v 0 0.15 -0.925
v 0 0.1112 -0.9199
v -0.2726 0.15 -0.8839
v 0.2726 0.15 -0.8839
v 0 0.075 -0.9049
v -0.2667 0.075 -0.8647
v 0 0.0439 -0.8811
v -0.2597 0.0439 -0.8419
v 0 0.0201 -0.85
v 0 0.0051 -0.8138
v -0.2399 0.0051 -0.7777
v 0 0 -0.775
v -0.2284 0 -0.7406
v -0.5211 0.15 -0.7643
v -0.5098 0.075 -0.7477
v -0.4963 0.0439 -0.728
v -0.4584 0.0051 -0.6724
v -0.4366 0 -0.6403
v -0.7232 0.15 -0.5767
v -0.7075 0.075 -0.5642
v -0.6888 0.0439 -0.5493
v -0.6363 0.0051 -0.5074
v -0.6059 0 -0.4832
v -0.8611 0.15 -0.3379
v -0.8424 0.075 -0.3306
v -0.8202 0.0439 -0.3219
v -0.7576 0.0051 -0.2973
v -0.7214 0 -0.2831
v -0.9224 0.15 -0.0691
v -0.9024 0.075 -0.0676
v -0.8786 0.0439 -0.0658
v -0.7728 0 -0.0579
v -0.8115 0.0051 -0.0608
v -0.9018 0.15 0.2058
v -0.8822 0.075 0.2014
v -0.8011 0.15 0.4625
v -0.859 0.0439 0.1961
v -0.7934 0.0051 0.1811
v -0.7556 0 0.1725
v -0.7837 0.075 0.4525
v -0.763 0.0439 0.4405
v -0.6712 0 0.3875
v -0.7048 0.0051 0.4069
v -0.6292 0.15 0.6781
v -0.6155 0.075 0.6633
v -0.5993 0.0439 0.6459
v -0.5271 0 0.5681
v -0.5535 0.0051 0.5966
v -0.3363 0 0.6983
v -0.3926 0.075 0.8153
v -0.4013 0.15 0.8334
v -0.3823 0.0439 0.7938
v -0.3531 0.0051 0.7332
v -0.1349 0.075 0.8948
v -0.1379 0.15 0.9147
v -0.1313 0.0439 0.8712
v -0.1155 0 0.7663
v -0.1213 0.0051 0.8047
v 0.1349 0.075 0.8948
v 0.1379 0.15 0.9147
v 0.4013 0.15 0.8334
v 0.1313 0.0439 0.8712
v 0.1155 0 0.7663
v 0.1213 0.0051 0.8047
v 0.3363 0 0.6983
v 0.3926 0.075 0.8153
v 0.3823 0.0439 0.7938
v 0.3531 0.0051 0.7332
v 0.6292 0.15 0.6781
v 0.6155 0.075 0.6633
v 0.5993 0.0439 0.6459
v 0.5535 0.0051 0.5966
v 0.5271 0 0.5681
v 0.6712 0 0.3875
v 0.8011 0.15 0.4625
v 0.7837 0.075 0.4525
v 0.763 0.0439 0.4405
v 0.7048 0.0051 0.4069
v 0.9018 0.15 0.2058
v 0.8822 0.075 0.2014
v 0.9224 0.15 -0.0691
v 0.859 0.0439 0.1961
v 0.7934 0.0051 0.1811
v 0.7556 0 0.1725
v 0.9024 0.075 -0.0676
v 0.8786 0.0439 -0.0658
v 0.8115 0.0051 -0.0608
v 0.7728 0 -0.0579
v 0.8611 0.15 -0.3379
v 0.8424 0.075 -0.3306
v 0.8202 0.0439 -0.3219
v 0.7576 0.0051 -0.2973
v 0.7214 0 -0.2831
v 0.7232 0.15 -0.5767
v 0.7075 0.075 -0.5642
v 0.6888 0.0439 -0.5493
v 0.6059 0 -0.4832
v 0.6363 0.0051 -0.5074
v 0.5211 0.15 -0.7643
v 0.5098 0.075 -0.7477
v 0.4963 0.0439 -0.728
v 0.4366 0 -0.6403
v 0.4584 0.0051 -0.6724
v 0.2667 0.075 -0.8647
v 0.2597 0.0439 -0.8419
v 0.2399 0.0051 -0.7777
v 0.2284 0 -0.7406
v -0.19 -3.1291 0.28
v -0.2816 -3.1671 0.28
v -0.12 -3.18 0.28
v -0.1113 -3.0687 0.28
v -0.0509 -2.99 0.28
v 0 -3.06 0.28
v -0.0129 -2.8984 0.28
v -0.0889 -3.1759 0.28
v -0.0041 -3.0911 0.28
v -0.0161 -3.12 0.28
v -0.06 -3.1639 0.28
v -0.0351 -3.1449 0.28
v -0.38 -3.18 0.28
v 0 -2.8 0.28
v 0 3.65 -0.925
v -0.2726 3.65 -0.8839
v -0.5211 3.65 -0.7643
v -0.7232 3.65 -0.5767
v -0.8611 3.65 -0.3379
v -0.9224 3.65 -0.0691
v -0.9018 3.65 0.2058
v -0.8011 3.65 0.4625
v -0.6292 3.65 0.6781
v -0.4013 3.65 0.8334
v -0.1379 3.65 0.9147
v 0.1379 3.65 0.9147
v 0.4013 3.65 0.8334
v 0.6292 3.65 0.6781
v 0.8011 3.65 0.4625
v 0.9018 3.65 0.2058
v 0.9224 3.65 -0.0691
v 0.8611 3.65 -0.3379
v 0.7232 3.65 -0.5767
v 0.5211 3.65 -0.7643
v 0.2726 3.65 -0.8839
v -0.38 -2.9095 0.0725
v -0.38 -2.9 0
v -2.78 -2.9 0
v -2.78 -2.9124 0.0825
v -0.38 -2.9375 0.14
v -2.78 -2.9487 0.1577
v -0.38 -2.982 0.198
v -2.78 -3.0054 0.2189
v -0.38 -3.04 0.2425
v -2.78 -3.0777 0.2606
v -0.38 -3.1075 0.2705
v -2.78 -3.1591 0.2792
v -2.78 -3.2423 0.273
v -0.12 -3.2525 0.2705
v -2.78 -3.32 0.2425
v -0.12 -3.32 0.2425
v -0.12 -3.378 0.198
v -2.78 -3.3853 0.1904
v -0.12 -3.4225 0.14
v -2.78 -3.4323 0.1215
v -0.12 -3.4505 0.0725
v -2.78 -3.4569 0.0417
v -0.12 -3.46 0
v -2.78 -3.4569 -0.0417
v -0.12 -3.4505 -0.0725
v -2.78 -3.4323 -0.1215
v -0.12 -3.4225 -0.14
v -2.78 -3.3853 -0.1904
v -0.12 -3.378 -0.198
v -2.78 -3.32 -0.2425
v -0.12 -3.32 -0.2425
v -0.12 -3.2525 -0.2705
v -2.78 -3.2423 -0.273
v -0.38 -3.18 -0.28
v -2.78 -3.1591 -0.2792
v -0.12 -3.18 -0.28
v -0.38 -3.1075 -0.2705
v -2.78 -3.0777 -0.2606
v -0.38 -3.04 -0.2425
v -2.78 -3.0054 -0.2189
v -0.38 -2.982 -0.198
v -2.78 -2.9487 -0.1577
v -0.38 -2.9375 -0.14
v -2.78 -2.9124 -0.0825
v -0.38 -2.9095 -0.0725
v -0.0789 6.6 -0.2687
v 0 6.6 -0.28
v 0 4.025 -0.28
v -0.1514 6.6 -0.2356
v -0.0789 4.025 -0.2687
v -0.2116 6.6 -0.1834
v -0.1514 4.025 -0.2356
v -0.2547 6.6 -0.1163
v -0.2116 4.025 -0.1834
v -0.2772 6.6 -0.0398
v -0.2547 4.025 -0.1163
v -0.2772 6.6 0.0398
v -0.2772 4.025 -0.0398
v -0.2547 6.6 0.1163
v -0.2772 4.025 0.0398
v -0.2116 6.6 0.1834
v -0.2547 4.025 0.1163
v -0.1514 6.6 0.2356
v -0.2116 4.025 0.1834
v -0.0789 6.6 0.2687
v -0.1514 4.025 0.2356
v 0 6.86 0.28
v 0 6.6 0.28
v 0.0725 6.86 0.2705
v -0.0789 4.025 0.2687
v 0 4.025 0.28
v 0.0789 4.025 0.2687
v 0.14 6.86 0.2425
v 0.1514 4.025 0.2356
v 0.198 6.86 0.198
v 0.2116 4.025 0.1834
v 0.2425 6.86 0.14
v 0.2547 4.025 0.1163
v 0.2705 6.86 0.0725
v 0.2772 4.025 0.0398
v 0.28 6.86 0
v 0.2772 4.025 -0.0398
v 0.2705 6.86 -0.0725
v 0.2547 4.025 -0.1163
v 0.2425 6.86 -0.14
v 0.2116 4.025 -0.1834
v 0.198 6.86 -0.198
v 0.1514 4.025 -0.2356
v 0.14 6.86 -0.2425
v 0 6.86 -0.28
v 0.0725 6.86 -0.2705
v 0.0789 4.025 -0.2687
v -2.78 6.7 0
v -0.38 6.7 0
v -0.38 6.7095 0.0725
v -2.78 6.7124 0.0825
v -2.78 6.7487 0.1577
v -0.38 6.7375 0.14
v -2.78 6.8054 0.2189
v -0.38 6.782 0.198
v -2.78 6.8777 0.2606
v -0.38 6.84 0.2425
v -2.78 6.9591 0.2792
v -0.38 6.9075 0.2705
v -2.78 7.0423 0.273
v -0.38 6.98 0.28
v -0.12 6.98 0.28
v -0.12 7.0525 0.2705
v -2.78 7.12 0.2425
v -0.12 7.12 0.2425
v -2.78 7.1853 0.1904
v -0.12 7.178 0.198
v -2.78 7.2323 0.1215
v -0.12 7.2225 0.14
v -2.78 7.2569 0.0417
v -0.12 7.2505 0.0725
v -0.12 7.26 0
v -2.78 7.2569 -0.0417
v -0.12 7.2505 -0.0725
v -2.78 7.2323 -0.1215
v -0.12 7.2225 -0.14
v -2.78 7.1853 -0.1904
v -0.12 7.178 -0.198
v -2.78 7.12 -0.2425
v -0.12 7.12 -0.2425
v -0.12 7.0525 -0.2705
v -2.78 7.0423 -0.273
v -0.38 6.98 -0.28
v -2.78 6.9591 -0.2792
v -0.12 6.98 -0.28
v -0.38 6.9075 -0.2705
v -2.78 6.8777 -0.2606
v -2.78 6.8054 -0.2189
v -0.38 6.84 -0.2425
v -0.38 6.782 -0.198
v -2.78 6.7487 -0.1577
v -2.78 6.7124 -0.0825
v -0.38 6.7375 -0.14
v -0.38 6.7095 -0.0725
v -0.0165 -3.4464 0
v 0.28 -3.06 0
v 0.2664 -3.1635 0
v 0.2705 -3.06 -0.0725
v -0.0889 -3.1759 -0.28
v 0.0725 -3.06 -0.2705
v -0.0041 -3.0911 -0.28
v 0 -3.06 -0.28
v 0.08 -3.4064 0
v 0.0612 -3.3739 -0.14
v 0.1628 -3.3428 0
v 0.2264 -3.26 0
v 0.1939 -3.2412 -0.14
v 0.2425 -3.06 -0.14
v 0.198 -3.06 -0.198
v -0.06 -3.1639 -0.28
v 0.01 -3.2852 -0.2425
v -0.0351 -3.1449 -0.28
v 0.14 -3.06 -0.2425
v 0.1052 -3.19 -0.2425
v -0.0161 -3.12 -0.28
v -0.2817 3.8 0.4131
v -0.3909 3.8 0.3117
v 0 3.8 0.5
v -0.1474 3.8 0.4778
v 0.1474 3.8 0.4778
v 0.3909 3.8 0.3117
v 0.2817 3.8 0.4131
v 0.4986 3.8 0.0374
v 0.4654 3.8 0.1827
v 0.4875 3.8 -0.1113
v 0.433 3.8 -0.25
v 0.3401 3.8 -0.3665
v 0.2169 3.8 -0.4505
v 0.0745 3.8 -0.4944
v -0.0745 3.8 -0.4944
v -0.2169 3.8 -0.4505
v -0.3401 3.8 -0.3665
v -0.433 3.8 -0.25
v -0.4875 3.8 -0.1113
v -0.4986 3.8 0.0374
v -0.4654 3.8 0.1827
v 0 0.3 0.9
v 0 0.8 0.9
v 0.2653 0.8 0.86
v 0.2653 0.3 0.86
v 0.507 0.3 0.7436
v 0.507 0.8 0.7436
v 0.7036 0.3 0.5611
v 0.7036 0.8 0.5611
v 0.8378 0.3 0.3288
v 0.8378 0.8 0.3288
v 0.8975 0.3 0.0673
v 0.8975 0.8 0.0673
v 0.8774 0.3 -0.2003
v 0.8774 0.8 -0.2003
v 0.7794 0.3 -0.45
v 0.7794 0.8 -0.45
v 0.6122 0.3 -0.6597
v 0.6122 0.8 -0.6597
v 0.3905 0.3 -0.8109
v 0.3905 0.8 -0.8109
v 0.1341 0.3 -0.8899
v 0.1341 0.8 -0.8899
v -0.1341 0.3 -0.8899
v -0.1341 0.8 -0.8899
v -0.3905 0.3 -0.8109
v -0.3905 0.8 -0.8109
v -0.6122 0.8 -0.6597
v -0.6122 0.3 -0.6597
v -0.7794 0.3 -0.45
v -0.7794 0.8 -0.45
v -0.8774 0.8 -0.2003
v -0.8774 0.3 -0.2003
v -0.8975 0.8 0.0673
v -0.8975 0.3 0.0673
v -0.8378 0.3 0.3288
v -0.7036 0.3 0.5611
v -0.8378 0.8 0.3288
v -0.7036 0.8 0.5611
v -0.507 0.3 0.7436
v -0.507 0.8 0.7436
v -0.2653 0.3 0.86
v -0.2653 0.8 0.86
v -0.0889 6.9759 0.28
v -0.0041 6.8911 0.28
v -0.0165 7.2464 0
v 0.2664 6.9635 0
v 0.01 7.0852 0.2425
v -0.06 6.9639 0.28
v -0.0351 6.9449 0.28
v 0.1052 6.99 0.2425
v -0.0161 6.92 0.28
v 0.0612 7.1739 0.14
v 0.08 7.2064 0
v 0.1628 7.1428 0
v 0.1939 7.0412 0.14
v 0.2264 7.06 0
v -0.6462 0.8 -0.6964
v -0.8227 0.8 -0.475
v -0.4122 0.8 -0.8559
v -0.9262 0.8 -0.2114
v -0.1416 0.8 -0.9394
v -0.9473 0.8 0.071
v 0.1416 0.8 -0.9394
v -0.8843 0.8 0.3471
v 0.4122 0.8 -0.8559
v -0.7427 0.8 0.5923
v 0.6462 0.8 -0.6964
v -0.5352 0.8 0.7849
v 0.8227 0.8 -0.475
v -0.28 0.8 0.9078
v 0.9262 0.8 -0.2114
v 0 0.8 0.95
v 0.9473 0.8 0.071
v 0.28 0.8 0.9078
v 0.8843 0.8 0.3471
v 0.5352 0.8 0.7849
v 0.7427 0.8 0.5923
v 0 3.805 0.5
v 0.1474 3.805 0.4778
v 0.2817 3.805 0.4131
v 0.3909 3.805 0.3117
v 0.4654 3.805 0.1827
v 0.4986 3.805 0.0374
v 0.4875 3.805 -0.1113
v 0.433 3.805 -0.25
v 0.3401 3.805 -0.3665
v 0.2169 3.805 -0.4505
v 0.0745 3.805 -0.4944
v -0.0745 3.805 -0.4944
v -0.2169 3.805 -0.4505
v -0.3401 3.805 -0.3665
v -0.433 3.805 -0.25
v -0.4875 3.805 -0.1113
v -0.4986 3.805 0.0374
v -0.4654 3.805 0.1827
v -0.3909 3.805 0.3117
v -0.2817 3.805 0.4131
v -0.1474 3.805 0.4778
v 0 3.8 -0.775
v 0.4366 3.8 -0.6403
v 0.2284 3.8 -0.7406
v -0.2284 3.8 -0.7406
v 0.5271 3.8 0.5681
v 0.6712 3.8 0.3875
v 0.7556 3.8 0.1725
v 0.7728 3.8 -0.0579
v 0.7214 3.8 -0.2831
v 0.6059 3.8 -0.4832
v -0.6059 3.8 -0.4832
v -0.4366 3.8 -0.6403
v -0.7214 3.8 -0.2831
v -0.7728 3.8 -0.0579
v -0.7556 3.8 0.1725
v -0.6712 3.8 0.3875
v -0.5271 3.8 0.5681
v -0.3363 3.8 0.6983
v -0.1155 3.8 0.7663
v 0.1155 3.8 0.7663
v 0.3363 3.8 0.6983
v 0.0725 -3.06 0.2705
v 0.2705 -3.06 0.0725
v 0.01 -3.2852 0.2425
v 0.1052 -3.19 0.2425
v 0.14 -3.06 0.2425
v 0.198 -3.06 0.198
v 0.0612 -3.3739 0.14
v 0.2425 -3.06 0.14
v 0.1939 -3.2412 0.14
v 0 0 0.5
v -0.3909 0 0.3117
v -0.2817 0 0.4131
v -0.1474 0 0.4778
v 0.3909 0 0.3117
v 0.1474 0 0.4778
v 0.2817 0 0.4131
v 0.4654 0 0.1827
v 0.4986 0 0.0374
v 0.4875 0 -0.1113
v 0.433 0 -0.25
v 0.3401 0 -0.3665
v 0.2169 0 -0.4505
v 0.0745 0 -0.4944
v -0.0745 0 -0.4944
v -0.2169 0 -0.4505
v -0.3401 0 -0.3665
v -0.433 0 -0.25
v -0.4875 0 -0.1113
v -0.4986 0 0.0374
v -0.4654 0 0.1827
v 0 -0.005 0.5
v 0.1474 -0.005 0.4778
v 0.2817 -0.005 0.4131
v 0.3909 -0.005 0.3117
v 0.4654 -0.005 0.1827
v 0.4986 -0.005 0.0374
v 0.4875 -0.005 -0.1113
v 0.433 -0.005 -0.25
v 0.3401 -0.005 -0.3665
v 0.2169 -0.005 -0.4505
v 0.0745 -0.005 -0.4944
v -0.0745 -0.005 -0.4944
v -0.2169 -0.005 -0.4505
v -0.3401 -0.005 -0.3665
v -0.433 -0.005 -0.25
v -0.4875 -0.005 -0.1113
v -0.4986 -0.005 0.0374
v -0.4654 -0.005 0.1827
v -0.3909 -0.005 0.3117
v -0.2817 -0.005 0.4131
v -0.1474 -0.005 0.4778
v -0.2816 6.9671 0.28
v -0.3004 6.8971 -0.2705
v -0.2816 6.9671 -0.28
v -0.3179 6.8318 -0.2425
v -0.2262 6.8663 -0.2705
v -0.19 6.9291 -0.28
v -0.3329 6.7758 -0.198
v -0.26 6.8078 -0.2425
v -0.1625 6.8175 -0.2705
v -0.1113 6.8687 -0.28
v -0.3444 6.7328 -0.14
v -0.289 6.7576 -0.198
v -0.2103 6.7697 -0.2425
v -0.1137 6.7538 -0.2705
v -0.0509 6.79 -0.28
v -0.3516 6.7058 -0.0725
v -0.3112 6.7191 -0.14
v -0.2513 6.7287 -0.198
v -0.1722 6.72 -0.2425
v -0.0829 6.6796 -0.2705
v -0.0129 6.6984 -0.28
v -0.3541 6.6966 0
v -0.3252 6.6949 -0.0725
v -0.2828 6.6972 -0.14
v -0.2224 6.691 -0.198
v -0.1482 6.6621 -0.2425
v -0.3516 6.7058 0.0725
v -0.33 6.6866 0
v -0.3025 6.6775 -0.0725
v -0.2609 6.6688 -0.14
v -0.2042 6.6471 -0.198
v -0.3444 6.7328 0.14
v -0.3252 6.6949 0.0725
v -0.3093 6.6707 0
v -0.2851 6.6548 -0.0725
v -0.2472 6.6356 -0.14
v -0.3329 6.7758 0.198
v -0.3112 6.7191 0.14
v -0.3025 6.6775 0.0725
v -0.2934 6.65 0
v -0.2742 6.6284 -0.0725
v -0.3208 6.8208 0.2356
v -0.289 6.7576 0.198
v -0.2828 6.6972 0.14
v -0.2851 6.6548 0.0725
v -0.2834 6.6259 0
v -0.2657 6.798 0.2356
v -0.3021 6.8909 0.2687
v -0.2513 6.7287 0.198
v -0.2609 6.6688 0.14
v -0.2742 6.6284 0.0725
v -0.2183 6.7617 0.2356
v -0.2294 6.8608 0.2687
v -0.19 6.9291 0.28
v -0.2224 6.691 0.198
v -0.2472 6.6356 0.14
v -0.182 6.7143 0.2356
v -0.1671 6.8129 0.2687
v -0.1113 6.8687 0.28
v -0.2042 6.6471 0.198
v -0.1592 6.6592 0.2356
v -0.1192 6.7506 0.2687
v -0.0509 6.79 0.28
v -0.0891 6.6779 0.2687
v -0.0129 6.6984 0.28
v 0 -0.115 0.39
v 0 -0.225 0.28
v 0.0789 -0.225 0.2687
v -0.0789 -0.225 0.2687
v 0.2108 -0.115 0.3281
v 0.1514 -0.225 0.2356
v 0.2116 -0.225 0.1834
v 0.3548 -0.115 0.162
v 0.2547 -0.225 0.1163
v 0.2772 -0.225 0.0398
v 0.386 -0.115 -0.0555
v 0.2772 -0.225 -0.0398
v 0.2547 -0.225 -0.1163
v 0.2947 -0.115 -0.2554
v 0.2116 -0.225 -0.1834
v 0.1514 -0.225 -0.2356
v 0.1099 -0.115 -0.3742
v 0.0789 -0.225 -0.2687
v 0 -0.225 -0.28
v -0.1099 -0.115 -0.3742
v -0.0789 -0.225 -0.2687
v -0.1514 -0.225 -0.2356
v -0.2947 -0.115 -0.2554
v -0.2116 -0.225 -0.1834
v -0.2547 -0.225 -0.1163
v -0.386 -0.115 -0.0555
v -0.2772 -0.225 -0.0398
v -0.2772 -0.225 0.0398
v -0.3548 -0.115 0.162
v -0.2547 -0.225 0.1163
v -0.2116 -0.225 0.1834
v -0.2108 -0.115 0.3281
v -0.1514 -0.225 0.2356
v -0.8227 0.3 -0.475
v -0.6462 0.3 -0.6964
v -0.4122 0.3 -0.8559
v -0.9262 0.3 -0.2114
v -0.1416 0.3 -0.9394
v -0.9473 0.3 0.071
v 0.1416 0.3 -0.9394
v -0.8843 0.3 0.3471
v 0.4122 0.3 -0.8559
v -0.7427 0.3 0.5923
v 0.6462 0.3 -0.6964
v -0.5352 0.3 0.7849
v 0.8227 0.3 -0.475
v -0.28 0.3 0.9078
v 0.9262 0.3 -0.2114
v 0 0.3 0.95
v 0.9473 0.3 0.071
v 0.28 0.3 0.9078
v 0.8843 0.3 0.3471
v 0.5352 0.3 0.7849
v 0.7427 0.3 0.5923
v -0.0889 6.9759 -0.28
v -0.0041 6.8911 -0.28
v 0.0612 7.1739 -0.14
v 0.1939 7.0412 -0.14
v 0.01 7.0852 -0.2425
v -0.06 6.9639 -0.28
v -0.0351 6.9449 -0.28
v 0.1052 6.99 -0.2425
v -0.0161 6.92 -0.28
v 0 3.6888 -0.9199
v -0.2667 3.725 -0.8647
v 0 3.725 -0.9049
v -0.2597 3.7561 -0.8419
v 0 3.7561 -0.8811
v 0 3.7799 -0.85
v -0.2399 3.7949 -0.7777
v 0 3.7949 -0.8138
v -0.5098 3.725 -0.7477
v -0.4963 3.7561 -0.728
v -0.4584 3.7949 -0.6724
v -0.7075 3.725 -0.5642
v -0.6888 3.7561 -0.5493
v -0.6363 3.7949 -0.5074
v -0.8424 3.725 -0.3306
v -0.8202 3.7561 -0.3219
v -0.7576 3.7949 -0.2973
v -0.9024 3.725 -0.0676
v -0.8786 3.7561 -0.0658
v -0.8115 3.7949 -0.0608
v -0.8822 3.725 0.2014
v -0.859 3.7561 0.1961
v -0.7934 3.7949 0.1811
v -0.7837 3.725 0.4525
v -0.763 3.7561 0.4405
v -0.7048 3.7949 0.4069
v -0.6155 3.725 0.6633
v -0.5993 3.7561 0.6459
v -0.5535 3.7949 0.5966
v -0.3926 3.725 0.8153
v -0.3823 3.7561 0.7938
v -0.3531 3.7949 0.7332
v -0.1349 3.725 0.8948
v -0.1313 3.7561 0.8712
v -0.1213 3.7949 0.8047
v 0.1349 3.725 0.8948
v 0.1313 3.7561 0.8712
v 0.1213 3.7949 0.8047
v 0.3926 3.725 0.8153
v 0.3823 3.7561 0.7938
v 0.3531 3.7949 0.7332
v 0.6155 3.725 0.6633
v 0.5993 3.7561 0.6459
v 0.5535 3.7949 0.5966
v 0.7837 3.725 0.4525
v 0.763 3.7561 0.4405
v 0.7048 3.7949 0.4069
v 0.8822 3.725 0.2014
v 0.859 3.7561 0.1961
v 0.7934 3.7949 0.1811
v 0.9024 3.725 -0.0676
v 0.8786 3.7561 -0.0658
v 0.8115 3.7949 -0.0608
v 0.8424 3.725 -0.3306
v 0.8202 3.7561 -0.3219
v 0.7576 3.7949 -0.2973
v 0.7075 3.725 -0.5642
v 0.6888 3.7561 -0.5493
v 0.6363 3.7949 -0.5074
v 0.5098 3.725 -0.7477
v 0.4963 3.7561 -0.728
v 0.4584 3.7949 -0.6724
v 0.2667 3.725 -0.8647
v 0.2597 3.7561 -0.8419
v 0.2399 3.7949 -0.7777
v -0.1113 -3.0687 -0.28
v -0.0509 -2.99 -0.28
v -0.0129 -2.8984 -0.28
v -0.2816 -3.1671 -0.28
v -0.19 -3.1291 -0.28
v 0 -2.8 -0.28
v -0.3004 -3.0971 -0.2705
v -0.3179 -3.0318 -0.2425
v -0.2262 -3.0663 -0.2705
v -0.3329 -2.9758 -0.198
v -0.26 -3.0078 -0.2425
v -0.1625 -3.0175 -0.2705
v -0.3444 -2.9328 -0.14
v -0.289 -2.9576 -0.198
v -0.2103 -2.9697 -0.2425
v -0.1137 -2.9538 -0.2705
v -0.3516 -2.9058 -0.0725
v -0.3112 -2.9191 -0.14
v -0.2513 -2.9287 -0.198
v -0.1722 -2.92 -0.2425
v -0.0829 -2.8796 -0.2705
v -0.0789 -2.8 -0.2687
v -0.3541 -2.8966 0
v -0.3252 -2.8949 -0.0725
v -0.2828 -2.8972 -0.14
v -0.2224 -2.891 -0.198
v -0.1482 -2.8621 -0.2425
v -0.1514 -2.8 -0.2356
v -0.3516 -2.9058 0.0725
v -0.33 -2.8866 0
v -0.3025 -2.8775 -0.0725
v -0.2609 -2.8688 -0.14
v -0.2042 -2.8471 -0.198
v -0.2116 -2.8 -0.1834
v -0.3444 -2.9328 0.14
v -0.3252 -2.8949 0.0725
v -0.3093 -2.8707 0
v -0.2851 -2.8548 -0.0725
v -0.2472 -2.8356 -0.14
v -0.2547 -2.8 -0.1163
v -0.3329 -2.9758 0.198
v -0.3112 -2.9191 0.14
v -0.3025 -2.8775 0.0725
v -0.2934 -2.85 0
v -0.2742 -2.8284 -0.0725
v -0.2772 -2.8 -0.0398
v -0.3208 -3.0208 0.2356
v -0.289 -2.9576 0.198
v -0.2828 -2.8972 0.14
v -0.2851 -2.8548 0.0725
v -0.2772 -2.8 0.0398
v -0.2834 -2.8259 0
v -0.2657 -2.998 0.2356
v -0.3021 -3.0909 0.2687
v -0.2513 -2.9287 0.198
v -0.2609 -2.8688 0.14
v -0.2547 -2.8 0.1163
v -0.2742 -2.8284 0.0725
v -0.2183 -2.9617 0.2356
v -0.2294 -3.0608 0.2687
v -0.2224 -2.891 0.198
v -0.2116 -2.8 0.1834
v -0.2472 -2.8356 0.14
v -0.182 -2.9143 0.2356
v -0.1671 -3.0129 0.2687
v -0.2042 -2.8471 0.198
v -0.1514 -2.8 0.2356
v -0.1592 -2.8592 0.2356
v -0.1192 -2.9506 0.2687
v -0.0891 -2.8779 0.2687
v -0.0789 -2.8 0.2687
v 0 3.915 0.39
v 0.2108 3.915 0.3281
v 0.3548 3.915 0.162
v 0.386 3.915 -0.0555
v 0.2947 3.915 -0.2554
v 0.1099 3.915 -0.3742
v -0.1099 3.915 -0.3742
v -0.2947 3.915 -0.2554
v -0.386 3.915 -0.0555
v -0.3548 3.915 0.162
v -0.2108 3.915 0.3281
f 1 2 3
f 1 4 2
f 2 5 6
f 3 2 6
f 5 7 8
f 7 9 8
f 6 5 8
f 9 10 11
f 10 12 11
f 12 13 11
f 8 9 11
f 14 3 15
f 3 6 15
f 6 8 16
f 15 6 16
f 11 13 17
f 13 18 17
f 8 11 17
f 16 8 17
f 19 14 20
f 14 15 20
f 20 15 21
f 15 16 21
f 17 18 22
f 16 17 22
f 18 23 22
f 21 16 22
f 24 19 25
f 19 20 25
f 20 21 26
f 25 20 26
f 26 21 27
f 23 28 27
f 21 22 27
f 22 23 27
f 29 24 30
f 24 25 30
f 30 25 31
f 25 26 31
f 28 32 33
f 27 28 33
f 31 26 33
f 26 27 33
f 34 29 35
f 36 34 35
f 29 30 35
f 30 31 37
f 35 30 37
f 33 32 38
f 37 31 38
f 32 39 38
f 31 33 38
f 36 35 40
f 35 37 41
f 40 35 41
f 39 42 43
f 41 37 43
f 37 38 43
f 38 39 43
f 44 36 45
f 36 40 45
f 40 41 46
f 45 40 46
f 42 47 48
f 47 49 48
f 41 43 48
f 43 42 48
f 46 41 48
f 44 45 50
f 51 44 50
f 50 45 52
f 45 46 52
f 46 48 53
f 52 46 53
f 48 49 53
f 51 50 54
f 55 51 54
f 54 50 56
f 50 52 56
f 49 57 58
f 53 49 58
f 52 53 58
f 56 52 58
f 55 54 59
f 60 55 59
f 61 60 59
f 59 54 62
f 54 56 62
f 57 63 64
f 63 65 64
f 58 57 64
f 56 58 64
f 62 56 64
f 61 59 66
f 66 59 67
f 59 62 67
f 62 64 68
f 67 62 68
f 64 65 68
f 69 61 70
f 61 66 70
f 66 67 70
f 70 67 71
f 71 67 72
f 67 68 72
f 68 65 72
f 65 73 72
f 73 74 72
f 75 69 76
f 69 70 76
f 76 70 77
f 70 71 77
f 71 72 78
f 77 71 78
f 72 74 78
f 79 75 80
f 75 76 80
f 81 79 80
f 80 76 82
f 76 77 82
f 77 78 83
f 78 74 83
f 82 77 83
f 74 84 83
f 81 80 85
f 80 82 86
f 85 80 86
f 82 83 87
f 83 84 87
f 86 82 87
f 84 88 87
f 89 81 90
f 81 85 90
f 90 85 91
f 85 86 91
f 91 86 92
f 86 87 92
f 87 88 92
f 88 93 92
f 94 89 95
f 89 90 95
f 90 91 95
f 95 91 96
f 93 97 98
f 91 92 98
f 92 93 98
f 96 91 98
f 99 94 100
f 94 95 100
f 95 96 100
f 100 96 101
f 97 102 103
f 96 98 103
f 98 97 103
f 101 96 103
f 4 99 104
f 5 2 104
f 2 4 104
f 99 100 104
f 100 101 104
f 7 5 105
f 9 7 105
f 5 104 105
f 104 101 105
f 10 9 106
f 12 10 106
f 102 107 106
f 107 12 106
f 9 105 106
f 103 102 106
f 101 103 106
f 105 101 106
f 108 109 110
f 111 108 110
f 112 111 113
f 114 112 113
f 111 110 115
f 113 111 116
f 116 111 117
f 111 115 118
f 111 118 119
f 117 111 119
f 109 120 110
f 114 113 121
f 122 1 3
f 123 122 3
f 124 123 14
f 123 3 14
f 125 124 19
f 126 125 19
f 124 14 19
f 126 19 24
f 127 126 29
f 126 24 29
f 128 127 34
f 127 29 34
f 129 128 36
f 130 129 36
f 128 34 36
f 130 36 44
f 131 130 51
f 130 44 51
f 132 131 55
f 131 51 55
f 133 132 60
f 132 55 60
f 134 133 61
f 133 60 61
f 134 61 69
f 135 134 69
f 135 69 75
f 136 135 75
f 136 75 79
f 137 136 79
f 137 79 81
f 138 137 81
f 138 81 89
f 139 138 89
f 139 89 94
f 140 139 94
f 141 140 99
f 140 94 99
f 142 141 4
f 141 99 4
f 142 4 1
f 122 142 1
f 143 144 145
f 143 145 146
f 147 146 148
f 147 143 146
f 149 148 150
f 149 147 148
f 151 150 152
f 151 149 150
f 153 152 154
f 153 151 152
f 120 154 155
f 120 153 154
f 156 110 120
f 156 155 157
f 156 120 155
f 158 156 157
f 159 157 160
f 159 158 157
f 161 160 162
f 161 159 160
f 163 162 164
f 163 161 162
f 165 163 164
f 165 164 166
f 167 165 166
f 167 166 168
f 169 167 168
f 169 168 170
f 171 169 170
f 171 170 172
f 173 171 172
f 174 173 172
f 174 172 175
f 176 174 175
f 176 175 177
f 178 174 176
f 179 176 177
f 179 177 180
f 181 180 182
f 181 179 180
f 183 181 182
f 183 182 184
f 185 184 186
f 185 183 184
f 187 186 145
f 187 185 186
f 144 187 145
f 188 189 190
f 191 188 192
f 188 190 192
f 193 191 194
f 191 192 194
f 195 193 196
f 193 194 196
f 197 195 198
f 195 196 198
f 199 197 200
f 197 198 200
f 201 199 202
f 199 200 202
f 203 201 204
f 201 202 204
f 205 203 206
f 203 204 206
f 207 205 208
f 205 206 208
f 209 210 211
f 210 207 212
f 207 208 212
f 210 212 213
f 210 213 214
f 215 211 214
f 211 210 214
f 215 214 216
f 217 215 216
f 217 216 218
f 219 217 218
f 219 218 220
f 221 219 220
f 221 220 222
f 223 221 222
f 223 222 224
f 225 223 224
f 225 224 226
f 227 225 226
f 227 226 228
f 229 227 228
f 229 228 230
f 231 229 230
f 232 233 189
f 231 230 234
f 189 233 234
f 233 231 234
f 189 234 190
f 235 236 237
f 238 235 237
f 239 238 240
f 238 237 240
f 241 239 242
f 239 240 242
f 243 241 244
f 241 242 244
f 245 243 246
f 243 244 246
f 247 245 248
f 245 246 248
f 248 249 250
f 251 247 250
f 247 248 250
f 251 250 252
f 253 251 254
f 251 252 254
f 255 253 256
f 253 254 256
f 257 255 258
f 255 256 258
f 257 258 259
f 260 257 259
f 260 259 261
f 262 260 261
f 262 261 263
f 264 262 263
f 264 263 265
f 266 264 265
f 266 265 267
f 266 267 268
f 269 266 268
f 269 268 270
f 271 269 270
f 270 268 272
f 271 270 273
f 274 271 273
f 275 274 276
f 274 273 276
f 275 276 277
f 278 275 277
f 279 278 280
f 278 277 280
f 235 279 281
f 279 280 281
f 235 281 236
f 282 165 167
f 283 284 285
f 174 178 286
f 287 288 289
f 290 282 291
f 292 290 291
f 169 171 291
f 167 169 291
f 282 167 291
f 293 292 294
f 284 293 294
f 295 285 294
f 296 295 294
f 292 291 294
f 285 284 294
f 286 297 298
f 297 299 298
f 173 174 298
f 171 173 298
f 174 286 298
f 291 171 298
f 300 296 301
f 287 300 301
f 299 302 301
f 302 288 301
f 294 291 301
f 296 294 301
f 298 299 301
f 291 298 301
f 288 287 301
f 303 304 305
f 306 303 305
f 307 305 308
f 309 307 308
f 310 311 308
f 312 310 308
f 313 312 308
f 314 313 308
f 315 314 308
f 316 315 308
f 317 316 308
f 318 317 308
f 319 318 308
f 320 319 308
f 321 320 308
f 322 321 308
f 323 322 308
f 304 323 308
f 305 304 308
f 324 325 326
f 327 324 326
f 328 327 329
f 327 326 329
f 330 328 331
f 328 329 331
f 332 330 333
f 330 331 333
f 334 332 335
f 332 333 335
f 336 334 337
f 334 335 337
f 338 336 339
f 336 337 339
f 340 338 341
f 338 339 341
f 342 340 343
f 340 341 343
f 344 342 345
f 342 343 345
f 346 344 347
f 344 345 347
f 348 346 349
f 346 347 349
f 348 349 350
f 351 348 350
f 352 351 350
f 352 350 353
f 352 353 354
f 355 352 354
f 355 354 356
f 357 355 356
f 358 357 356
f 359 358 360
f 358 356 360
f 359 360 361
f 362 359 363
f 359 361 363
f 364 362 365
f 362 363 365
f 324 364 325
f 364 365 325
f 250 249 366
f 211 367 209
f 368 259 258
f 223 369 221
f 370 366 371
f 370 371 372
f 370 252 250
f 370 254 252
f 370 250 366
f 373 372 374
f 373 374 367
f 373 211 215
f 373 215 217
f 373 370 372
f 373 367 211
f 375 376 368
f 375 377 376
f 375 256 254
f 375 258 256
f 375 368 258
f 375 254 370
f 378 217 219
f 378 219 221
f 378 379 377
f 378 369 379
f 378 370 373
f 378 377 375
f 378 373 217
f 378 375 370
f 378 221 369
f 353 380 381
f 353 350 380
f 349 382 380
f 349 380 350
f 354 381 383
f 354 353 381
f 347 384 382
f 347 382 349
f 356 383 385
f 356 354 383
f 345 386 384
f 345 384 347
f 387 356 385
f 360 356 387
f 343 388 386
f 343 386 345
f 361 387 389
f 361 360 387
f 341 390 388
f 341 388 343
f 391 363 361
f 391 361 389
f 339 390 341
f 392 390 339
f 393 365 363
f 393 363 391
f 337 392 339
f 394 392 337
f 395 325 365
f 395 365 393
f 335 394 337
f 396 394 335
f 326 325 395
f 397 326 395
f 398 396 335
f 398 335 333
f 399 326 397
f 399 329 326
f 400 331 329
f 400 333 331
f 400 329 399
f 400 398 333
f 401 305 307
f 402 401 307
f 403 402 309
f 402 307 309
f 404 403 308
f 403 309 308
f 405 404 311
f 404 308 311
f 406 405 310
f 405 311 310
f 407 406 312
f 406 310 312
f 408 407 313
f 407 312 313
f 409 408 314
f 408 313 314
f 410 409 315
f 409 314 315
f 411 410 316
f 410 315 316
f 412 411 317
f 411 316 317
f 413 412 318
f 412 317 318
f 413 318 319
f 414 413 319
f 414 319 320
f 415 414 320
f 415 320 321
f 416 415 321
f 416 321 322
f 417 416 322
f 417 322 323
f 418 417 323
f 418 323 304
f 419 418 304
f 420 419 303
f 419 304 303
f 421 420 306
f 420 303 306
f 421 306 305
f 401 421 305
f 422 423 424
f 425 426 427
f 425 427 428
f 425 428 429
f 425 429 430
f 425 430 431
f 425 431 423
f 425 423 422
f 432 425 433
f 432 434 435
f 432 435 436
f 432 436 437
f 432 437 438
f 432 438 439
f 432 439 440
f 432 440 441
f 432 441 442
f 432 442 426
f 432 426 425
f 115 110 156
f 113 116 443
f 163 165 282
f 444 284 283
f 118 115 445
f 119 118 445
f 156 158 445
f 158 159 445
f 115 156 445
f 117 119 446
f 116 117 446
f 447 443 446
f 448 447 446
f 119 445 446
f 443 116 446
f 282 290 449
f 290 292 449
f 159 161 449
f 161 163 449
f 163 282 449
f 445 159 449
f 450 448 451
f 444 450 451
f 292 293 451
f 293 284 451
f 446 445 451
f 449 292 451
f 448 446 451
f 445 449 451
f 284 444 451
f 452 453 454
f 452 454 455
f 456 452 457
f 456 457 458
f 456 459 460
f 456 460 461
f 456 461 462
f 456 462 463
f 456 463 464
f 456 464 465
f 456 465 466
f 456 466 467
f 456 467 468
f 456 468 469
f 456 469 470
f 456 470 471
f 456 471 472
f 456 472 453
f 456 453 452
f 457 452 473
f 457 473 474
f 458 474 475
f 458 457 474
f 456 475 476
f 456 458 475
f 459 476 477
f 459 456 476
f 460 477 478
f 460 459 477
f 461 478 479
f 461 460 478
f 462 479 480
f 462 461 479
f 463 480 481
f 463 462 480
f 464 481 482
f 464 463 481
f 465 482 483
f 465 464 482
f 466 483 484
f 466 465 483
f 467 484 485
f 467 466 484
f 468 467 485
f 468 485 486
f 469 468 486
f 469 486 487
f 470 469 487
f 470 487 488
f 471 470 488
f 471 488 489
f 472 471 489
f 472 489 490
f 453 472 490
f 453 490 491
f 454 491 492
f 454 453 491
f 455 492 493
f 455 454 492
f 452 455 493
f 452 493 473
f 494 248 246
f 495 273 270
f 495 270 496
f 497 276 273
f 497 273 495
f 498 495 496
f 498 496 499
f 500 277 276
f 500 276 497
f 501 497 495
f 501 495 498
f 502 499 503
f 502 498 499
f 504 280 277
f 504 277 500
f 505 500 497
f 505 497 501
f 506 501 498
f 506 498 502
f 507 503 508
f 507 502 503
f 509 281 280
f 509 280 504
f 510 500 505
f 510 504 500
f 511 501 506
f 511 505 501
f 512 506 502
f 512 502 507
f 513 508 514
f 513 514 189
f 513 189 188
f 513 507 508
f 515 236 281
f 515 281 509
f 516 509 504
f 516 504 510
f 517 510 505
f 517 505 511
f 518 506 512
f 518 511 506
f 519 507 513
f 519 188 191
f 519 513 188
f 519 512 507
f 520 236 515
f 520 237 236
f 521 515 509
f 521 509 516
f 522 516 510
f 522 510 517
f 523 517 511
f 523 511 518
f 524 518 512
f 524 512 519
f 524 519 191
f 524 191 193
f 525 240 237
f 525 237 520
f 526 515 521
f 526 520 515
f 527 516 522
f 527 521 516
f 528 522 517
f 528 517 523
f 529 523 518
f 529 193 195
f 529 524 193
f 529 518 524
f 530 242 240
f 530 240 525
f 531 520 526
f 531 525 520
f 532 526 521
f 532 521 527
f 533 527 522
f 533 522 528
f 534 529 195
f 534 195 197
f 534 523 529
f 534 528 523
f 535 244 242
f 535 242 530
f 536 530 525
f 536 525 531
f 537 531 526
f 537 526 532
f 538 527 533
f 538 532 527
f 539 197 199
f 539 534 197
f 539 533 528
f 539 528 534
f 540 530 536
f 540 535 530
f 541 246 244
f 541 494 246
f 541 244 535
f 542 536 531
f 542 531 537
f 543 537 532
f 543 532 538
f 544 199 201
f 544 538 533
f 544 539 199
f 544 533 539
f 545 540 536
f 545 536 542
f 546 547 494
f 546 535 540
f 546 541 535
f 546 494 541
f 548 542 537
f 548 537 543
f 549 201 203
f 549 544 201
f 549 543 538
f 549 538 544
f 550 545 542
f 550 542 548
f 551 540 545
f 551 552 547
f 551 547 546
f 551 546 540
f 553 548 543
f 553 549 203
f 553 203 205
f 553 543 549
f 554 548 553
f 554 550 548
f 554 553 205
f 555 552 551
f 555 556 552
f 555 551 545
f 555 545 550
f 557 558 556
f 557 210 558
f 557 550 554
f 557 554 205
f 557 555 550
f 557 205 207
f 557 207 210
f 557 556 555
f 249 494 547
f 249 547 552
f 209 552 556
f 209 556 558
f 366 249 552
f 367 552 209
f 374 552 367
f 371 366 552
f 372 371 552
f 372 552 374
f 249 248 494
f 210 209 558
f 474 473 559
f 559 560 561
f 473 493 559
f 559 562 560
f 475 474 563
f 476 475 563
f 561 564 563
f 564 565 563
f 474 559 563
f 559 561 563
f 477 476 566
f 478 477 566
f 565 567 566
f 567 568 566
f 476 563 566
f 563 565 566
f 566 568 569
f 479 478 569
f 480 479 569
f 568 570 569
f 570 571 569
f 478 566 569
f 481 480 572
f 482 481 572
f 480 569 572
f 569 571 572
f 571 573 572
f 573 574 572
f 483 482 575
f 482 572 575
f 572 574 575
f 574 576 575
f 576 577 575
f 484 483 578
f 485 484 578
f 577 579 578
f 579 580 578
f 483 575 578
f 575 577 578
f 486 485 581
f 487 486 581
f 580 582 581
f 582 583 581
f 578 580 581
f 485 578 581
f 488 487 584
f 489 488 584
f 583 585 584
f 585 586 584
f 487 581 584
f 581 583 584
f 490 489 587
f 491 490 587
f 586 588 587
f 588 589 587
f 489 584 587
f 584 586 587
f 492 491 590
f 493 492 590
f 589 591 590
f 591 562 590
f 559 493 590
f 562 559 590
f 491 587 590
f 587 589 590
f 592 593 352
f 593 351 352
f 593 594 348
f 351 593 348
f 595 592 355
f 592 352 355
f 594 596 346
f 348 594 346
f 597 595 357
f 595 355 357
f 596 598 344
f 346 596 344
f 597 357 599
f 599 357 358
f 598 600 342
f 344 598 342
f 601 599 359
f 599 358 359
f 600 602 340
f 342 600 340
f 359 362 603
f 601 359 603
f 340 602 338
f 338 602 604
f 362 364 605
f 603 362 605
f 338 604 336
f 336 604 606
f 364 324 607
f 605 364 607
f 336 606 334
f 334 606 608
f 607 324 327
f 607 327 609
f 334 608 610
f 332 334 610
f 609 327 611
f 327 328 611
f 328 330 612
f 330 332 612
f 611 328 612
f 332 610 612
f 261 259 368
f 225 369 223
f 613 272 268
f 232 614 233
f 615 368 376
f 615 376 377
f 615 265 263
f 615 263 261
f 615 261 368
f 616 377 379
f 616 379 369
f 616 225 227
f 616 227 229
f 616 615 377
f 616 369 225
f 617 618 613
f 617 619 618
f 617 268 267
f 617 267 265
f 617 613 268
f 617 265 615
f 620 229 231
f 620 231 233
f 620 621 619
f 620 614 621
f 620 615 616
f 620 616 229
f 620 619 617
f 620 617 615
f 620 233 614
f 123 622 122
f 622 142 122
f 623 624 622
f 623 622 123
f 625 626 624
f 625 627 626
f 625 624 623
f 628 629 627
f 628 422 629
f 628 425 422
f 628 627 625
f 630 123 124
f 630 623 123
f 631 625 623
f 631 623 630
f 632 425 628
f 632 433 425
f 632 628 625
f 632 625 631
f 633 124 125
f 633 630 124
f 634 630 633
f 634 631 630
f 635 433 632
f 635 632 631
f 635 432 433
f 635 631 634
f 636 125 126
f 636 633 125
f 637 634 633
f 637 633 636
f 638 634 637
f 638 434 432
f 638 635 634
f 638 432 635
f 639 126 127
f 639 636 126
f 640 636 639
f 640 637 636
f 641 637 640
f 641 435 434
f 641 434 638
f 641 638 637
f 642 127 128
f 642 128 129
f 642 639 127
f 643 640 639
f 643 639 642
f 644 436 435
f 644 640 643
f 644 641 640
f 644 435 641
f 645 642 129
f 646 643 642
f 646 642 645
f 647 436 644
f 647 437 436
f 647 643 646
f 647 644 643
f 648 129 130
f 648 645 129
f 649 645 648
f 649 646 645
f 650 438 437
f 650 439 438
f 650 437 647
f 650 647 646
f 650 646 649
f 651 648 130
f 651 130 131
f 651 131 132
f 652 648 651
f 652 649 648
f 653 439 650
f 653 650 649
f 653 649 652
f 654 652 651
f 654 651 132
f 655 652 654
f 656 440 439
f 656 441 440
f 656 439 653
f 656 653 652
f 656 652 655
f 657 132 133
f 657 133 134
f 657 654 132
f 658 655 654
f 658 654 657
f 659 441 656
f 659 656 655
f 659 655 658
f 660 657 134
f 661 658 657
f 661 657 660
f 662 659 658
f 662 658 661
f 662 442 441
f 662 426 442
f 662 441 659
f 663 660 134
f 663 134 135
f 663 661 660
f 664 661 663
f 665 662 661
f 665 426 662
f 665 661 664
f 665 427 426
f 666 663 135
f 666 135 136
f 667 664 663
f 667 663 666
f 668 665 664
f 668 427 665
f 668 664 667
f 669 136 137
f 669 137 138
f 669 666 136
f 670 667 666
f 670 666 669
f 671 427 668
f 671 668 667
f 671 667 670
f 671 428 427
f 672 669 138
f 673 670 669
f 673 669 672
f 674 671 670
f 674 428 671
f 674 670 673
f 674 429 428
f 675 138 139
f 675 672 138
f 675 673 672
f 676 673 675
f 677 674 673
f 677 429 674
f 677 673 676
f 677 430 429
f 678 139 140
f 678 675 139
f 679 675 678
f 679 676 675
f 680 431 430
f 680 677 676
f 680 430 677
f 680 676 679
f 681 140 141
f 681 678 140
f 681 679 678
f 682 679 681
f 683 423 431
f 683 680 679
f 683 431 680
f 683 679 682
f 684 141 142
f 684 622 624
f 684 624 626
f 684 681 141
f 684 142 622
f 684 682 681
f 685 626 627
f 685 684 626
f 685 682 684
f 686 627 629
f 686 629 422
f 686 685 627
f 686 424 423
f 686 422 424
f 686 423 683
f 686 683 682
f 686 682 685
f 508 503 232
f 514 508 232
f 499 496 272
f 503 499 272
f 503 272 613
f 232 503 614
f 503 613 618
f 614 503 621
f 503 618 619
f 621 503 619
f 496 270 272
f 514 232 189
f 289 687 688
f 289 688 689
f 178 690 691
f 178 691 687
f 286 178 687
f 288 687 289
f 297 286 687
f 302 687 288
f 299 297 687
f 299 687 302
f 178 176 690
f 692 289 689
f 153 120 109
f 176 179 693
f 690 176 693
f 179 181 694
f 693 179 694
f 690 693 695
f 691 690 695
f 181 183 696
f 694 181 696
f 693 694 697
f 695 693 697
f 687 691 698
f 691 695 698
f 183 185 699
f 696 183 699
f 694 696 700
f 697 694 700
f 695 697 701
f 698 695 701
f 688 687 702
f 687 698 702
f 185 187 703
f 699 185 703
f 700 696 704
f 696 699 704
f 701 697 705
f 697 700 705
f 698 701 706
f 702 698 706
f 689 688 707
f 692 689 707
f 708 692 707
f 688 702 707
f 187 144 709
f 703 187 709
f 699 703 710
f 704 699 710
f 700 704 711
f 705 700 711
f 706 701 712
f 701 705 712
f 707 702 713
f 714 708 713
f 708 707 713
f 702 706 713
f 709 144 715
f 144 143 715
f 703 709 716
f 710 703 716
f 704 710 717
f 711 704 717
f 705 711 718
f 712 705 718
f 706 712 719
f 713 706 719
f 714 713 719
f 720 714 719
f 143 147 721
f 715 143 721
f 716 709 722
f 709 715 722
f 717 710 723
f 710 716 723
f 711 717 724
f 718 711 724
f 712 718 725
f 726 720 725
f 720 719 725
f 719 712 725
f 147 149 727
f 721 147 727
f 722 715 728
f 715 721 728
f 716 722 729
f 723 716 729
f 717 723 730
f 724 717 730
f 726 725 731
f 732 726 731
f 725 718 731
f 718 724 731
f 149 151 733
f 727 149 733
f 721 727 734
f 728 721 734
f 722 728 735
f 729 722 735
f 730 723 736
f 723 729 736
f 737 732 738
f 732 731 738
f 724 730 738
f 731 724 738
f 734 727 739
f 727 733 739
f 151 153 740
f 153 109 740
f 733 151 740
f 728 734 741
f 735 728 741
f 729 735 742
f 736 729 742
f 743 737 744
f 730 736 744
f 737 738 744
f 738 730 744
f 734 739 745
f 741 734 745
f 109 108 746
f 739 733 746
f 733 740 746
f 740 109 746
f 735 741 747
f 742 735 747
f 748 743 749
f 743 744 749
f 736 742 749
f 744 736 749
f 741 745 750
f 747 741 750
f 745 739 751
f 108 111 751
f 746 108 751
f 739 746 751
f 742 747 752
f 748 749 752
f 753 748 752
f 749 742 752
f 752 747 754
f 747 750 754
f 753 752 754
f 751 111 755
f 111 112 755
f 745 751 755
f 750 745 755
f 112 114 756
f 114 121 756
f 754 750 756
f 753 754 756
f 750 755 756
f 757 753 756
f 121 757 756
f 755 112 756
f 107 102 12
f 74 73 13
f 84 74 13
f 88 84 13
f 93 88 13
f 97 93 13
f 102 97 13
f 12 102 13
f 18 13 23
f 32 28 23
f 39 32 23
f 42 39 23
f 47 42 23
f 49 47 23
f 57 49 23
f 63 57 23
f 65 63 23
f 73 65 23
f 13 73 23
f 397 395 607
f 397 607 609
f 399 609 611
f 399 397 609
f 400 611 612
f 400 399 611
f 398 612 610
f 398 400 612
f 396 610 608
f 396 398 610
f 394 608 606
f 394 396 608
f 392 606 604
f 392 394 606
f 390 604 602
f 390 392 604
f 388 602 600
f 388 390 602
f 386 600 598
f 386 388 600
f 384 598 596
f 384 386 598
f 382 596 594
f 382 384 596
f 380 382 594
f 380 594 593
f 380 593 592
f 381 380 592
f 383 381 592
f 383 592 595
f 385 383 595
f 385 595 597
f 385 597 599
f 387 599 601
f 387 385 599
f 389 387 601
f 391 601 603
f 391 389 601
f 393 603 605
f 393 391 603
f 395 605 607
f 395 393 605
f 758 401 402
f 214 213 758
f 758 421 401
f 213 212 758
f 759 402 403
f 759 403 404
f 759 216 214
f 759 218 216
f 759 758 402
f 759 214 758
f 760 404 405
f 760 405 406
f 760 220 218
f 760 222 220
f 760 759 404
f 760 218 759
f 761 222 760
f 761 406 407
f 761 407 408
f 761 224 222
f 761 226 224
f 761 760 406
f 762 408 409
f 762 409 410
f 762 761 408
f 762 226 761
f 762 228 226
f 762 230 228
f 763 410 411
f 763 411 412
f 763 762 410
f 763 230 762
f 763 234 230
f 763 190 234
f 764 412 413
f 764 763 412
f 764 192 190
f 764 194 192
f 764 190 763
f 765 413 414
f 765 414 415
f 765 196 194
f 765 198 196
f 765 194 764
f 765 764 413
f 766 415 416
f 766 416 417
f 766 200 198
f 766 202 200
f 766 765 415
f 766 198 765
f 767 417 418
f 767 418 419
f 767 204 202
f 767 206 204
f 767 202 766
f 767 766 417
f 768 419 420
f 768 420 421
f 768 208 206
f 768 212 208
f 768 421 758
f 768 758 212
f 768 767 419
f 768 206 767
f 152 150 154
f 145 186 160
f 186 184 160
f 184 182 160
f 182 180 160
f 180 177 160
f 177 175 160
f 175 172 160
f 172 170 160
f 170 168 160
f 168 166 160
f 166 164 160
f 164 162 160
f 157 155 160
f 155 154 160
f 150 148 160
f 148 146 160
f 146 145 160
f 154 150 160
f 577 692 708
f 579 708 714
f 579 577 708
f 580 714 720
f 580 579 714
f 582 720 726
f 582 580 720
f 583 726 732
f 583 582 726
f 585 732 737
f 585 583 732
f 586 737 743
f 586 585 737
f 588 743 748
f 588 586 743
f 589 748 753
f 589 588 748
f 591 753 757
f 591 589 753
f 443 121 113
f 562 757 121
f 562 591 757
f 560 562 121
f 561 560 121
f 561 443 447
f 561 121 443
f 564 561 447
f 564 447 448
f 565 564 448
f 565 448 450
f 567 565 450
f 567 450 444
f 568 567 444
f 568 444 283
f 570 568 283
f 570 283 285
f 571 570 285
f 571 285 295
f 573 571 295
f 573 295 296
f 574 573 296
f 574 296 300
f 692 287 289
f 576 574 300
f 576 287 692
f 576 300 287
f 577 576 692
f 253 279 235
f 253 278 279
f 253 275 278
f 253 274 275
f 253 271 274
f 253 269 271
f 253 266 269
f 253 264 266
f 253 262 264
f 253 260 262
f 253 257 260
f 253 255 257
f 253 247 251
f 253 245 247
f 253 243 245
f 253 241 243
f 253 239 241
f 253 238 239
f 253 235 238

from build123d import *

# Parameters (mm, degrees)
SKETCH1_R           = 0.925
BOSS_EXTRUDE1_DEPTH = 3.8
SKETCH2_R           = 0.5
BOSS_EXTRUDE2_DEPTH = 0.225
CHAMFER2_SIZE       = 0.22
FILLET1_R           = 0.15
FILLET2_R           = 0.15
SKETCH8_W           = 0.56
SKETCH8_H           = 0.56
BOSS_EXTRUDE7_DEPTH = 3.235
SKETCH9_W           = 0.56
SKETCH9_H           = 0.56
BOSS_EXTRUDE8_DEPTH = 2.5
FILLET7_R           = 0.1
FILLET7_R_2         = 0.4
FILLET7_R_3         = 0.28
SKETCH10_R          = 0.95
SKETCH10_R_2        = 0.9
BOSS_EXTRUDE9_DEPTH = 0.5


with BuildPart() as part:
    # Sketch1 → Boss-Extrude1 (new body)
    with BuildSketch(Plane(origin=(0, 0, 0), x_dir=(1, 0, 0), z_dir=(0, 1, 0))):
        with Locations(Location((0, 0, 0), (0, 0, 90))):
            Circle(SKETCH1_R)
    extrude(amount=BOSS_EXTRUDE1_DEPTH)

    # Fillet1
    fillet1_edges = [part.edges().sort_by_distance(p)[0] for p in [
        (0, 3.8, 0.925),
    ]]
    fillet(fillet1_edges, radius=FILLET1_R)

    # Fillet2
    fillet2_edges = [part.edges().sort_by_distance(p)[0] for p in [
        (0, 0, 0.925),
    ]]
    fillet(fillet2_edges, radius=FILLET2_R)


with BuildPart() as body_2:
    # Sketch2 → Boss-Extrude2 (new body)
    with BuildSketch(Plane(origin=(0, 3.8, 0), x_dir=(1, 0, 0), z_dir=(0, 1, 0))):
        with Locations(Location((0, 0, 0), (0, 0, 270))):
            Circle(SKETCH2_R)
    extrude(amount=BOSS_EXTRUDE2_DEPTH)

    # Chamfer2
    chamfer2_edges = [body_2.edges().sort_by_distance(p)[0] for p in [
        (0, 4.025, -0.5),
    ]]
    chamfer(chamfer2_edges, length=CHAMFER2_SIZE)

    # Sketch8 → Boss-Extrude7 (add)
    with BuildSketch(Plane(origin=(0, 4.025, 0), x_dir=(1, 0, 0), z_dir=(0, 1, 0))):
        Rectangle(SKETCH8_W, SKETCH8_H)
    extrude(amount=BOSS_EXTRUDE7_DEPTH)

    # Sketch9 → Boss-Extrude8 (add)
    with BuildSketch(Plane.ZY.offset(0.28)):
        with Locations((0, 6.98)):
            Rectangle(SKETCH9_W, SKETCH9_H)
    extrude(amount=BOSS_EXTRUDE8_DEPTH)

    # Fillet7
    # the kernel refuses this fillet: 0.4, 0.28, 0.1 mm, written as the material it adds along each edge
    with BuildSketch(Plane(origin=(-0.28, 6.7, 0.28), x_dir=(-1, 0, 0), z_dir=(0, 0, -1))) as fillet7_piece_1:
        with BuildLine():
            CenterArc((FILLET7_R, -FILLET7_R), FILLET7_R, 90, 90)
            Line((0, -FILLET7_R), (0, 0))
            Line((0, 0), (FILLET7_R, 0))
        make_face()
    extrude(amount=0.56)
    # the kernel refuses this fillet: 0.4, 0.28, 0.1 mm, written as the material it takes off along each edge
    with BuildSketch(Plane(origin=(0.28, 7.26, -1.28), x_dir=(0, -1, 0), z_dir=(0, 0, 1))) as fillet7_2_piece_1:
        with BuildLine():
            CenterArc((FILLET7_R_2, -FILLET7_R_2), FILLET7_R_2, 90, 90)
            Line((0, -FILLET7_R_2), (0, 0))
            Line((0, 0), (FILLET7_R_2, 0))
        make_face()
    extrude(amount=2.56, mode=Mode.SUBTRACT)
    # the kernel refuses this fillet: 0.4, 0.28, 0.1 mm, written as the material it takes off along each edge
    with BuildSketch(Plane(origin=(0.28, 4.025, 0.28), x_dir=(0, 0, -1), z_dir=(0, 1, 0))) as fillet7_3_piece_1:
        with BuildLine():
            CenterArc((FILLET7_R_3, FILLET7_R_3), FILLET7_R_3, 180, 90)
            Line((0, FILLET7_R_3), (0, 0))
            Line((0, 0), (FILLET7_R_3, 0))
        make_face()
    extrude(amount=2.835, mode=Mode.SUBTRACT)
    with BuildSketch(Plane(origin=(0.28, 4.025, -0.28), x_dir=(0, 0, 1), z_dir=(0, 1, 0))) as fillet7_3_piece_2:
        with BuildLine():
            CenterArc((FILLET7_R_3, -FILLET7_R_3), FILLET7_R_3, 90, 90)
            Line((0, -FILLET7_R_3), (0, 0))
            Line((0, 0), (FILLET7_R_3, 0))
        make_face()
    extrude(amount=2.835, mode=Mode.SUBTRACT)
    with BuildSketch(Plane(origin=(-0.28, 4.025, 0.28), x_dir=(1, 0, 0), z_dir=(0, 1, 0))) as fillet7_3_piece_3:
        with BuildLine():
            CenterArc((FILLET7_R_3, FILLET7_R_3), FILLET7_R_3, 180, 90)
            Line((0, FILLET7_R_3), (0, 0))
            Line((0, 0), (FILLET7_R_3, 0))
        make_face()
    extrude(amount=2.575, mode=Mode.SUBTRACT)
    with BuildSketch(Plane(origin=(-0.38, 6.7, -0.28), x_dir=(0, 1, 0), z_dir=(-1, 0, 0))) as fillet7_3_piece_4:
        with BuildLine():
            CenterArc((FILLET7_R_3, -FILLET7_R_3), FILLET7_R_3, 90, 90)
            Line((0, -FILLET7_R_3), (0, 0))
            Line((0, 0), (FILLET7_R_3, 0))
        make_face()
    extrude(amount=3.1, mode=Mode.SUBTRACT)
    with BuildSketch(Plane(origin=(-0.12, 7.26, 0.28), x_dir=(0, -1, 0), z_dir=(-1, 0, 0)), Plane(origin=(-3.48, 7.26, -0.28), x_dir=(0, -1, 0), z_dir=(1, 0, 0))) as fillet7_3_piece_5:
        with BuildLine():
            CenterArc((FILLET7_R_3, -FILLET7_R_3), FILLET7_R_3, 90, 90)
            Line((0, -FILLET7_R_3), (0, 0))
            Line((0, 0), (FILLET7_R_3, 0))
        make_face()
    extrude(amount=3.36, mode=Mode.SUBTRACT)
    with BuildSketch(Plane(origin=(-0.28, 4.025, -0.28), x_dir=(1, 0, 0), z_dir=(0, 1, 0))) as fillet7_3_piece_6:
        with BuildLine():
            CenterArc((FILLET7_R_3, -FILLET7_R_3), FILLET7_R_3, 90, 90)
            Line((0, -FILLET7_R_3), (0, 0))
            Line((0, 0), (FILLET7_R_3, 0))
        make_face()
    extrude(amount=2.575, mode=Mode.SUBTRACT)
    with BuildSketch(Plane(origin=(-0.38, 6.7, 0.28), x_dir=(0, 1, 0), z_dir=(-1, 0, 0))) as fillet7_3_piece_7:
        with BuildLine():
            CenterArc((FILLET7_R_3, FILLET7_R_3), FILLET7_R_3, 180, 90)
            Line((0, FILLET7_R_3), (0, 0))
            Line((0, 0), (FILLET7_R_3, 0))
        make_face()
    extrude(amount=3.1, mode=Mode.SUBTRACT)
    with BuildSketch(Plane(origin=(-0.38, 6.6, 0.28), x_dir=(0, 1, 0), z_dir=(-1, 0, 0))) as fillet7_3_piece_8:
        with BuildLine():
            CenterArc((0.1 + FILLET7_R_3, FILLET7_R_3), FILLET7_R_3, 180, 90)
            Line((0.1, FILLET7_R_3), (0.1, 0))
            Line((0.1, 0), (0.1 + FILLET7_R_3, 0))
        make_face()
    revolve(axis=Axis((-0.38, 6.6, 0.28), (0, 0, -1)), revolution_arc=90, mode=Mode.SUBTRACT)
    with BuildSketch(Plane(origin=(-0.38, 6.6, -0.28), x_dir=(0, 1, 0), z_dir=(-1, 0, 0))) as fillet7_3_piece_9:
        with BuildLine():
            CenterArc((0.1 + FILLET7_R_3, -FILLET7_R_3), FILLET7_R_3, 90, 90)
            Line((0.1, -FILLET7_R_3), (0.1, 0))
            Line((0.1, 0), (0.1 + FILLET7_R_3, 0))
        make_face()
    revolve(axis=Axis((-0.38, 6.6, -0.28), (0, 0, -1)), revolution_arc=90, mode=Mode.SUBTRACT)
    with BuildSketch(Plane(origin=(-0.12, 6.86, -0.28), x_dir=(0, 1, 0), z_dir=(-1, 0, 0))) as fillet7_3_piece_10:
        with BuildLine():
            CenterArc((0.4 - FILLET7_R_3, -FILLET7_R_3), FILLET7_R_3, 360, 90)
            Line((0.4, -FILLET7_R_3), (0.4, 0))
            Line((0.4, 0), (0.4 - FILLET7_R_3, 0))
        make_face()
    revolve(axis=Axis((-0.12, 6.86, -0.28), (0, 0, -1)), revolution_arc=90, mode=Mode.SUBTRACT)
    with BuildSketch(Plane(origin=(-0.12, 6.86, 0.28), x_dir=(0, 1, 0), z_dir=(-1, 0, 0))) as fillet7_3_piece_11:
        with BuildLine():
            CenterArc((0.4 - FILLET7_R_3, FILLET7_R_3), FILLET7_R_3, 270, 90)
            Line((0.4, FILLET7_R_3), (0.4, 0))
            Line((0.4, 0), (0.4 - FILLET7_R_3, 0))
        make_face()
    revolve(axis=Axis((-0.12, 6.86, 0.28), (0, 0, -1)), revolution_arc=90, mode=Mode.SUBTRACT)


with BuildPart() as body_3:
    # Mirror1: mirrored copy
    add(body_2.part.mirror(Plane.ZX.offset(1.9)))


with BuildPart() as body_4:
    # Sketch10 → Boss-Extrude9 (new body)
    with BuildSketch(Plane(origin=(0, 0.8, 0), x_dir=(-1, 0, 0), z_dir=(0, 1, 0))):
        with Locations(Location((0, 0, 0), (0, 0, 90))):
            Circle(SKETCH10_R)
        with Locations(Location((0, 0, 0), (0, 0, 90))):
            Circle(SKETCH10_R_2, mode=Mode.SUBTRACT)
    extrude(amount=-BOSS_EXTRUDE9_DEPTH)


solid = Compound([part.part, body_2.part, body_3.part, body_4.part])
